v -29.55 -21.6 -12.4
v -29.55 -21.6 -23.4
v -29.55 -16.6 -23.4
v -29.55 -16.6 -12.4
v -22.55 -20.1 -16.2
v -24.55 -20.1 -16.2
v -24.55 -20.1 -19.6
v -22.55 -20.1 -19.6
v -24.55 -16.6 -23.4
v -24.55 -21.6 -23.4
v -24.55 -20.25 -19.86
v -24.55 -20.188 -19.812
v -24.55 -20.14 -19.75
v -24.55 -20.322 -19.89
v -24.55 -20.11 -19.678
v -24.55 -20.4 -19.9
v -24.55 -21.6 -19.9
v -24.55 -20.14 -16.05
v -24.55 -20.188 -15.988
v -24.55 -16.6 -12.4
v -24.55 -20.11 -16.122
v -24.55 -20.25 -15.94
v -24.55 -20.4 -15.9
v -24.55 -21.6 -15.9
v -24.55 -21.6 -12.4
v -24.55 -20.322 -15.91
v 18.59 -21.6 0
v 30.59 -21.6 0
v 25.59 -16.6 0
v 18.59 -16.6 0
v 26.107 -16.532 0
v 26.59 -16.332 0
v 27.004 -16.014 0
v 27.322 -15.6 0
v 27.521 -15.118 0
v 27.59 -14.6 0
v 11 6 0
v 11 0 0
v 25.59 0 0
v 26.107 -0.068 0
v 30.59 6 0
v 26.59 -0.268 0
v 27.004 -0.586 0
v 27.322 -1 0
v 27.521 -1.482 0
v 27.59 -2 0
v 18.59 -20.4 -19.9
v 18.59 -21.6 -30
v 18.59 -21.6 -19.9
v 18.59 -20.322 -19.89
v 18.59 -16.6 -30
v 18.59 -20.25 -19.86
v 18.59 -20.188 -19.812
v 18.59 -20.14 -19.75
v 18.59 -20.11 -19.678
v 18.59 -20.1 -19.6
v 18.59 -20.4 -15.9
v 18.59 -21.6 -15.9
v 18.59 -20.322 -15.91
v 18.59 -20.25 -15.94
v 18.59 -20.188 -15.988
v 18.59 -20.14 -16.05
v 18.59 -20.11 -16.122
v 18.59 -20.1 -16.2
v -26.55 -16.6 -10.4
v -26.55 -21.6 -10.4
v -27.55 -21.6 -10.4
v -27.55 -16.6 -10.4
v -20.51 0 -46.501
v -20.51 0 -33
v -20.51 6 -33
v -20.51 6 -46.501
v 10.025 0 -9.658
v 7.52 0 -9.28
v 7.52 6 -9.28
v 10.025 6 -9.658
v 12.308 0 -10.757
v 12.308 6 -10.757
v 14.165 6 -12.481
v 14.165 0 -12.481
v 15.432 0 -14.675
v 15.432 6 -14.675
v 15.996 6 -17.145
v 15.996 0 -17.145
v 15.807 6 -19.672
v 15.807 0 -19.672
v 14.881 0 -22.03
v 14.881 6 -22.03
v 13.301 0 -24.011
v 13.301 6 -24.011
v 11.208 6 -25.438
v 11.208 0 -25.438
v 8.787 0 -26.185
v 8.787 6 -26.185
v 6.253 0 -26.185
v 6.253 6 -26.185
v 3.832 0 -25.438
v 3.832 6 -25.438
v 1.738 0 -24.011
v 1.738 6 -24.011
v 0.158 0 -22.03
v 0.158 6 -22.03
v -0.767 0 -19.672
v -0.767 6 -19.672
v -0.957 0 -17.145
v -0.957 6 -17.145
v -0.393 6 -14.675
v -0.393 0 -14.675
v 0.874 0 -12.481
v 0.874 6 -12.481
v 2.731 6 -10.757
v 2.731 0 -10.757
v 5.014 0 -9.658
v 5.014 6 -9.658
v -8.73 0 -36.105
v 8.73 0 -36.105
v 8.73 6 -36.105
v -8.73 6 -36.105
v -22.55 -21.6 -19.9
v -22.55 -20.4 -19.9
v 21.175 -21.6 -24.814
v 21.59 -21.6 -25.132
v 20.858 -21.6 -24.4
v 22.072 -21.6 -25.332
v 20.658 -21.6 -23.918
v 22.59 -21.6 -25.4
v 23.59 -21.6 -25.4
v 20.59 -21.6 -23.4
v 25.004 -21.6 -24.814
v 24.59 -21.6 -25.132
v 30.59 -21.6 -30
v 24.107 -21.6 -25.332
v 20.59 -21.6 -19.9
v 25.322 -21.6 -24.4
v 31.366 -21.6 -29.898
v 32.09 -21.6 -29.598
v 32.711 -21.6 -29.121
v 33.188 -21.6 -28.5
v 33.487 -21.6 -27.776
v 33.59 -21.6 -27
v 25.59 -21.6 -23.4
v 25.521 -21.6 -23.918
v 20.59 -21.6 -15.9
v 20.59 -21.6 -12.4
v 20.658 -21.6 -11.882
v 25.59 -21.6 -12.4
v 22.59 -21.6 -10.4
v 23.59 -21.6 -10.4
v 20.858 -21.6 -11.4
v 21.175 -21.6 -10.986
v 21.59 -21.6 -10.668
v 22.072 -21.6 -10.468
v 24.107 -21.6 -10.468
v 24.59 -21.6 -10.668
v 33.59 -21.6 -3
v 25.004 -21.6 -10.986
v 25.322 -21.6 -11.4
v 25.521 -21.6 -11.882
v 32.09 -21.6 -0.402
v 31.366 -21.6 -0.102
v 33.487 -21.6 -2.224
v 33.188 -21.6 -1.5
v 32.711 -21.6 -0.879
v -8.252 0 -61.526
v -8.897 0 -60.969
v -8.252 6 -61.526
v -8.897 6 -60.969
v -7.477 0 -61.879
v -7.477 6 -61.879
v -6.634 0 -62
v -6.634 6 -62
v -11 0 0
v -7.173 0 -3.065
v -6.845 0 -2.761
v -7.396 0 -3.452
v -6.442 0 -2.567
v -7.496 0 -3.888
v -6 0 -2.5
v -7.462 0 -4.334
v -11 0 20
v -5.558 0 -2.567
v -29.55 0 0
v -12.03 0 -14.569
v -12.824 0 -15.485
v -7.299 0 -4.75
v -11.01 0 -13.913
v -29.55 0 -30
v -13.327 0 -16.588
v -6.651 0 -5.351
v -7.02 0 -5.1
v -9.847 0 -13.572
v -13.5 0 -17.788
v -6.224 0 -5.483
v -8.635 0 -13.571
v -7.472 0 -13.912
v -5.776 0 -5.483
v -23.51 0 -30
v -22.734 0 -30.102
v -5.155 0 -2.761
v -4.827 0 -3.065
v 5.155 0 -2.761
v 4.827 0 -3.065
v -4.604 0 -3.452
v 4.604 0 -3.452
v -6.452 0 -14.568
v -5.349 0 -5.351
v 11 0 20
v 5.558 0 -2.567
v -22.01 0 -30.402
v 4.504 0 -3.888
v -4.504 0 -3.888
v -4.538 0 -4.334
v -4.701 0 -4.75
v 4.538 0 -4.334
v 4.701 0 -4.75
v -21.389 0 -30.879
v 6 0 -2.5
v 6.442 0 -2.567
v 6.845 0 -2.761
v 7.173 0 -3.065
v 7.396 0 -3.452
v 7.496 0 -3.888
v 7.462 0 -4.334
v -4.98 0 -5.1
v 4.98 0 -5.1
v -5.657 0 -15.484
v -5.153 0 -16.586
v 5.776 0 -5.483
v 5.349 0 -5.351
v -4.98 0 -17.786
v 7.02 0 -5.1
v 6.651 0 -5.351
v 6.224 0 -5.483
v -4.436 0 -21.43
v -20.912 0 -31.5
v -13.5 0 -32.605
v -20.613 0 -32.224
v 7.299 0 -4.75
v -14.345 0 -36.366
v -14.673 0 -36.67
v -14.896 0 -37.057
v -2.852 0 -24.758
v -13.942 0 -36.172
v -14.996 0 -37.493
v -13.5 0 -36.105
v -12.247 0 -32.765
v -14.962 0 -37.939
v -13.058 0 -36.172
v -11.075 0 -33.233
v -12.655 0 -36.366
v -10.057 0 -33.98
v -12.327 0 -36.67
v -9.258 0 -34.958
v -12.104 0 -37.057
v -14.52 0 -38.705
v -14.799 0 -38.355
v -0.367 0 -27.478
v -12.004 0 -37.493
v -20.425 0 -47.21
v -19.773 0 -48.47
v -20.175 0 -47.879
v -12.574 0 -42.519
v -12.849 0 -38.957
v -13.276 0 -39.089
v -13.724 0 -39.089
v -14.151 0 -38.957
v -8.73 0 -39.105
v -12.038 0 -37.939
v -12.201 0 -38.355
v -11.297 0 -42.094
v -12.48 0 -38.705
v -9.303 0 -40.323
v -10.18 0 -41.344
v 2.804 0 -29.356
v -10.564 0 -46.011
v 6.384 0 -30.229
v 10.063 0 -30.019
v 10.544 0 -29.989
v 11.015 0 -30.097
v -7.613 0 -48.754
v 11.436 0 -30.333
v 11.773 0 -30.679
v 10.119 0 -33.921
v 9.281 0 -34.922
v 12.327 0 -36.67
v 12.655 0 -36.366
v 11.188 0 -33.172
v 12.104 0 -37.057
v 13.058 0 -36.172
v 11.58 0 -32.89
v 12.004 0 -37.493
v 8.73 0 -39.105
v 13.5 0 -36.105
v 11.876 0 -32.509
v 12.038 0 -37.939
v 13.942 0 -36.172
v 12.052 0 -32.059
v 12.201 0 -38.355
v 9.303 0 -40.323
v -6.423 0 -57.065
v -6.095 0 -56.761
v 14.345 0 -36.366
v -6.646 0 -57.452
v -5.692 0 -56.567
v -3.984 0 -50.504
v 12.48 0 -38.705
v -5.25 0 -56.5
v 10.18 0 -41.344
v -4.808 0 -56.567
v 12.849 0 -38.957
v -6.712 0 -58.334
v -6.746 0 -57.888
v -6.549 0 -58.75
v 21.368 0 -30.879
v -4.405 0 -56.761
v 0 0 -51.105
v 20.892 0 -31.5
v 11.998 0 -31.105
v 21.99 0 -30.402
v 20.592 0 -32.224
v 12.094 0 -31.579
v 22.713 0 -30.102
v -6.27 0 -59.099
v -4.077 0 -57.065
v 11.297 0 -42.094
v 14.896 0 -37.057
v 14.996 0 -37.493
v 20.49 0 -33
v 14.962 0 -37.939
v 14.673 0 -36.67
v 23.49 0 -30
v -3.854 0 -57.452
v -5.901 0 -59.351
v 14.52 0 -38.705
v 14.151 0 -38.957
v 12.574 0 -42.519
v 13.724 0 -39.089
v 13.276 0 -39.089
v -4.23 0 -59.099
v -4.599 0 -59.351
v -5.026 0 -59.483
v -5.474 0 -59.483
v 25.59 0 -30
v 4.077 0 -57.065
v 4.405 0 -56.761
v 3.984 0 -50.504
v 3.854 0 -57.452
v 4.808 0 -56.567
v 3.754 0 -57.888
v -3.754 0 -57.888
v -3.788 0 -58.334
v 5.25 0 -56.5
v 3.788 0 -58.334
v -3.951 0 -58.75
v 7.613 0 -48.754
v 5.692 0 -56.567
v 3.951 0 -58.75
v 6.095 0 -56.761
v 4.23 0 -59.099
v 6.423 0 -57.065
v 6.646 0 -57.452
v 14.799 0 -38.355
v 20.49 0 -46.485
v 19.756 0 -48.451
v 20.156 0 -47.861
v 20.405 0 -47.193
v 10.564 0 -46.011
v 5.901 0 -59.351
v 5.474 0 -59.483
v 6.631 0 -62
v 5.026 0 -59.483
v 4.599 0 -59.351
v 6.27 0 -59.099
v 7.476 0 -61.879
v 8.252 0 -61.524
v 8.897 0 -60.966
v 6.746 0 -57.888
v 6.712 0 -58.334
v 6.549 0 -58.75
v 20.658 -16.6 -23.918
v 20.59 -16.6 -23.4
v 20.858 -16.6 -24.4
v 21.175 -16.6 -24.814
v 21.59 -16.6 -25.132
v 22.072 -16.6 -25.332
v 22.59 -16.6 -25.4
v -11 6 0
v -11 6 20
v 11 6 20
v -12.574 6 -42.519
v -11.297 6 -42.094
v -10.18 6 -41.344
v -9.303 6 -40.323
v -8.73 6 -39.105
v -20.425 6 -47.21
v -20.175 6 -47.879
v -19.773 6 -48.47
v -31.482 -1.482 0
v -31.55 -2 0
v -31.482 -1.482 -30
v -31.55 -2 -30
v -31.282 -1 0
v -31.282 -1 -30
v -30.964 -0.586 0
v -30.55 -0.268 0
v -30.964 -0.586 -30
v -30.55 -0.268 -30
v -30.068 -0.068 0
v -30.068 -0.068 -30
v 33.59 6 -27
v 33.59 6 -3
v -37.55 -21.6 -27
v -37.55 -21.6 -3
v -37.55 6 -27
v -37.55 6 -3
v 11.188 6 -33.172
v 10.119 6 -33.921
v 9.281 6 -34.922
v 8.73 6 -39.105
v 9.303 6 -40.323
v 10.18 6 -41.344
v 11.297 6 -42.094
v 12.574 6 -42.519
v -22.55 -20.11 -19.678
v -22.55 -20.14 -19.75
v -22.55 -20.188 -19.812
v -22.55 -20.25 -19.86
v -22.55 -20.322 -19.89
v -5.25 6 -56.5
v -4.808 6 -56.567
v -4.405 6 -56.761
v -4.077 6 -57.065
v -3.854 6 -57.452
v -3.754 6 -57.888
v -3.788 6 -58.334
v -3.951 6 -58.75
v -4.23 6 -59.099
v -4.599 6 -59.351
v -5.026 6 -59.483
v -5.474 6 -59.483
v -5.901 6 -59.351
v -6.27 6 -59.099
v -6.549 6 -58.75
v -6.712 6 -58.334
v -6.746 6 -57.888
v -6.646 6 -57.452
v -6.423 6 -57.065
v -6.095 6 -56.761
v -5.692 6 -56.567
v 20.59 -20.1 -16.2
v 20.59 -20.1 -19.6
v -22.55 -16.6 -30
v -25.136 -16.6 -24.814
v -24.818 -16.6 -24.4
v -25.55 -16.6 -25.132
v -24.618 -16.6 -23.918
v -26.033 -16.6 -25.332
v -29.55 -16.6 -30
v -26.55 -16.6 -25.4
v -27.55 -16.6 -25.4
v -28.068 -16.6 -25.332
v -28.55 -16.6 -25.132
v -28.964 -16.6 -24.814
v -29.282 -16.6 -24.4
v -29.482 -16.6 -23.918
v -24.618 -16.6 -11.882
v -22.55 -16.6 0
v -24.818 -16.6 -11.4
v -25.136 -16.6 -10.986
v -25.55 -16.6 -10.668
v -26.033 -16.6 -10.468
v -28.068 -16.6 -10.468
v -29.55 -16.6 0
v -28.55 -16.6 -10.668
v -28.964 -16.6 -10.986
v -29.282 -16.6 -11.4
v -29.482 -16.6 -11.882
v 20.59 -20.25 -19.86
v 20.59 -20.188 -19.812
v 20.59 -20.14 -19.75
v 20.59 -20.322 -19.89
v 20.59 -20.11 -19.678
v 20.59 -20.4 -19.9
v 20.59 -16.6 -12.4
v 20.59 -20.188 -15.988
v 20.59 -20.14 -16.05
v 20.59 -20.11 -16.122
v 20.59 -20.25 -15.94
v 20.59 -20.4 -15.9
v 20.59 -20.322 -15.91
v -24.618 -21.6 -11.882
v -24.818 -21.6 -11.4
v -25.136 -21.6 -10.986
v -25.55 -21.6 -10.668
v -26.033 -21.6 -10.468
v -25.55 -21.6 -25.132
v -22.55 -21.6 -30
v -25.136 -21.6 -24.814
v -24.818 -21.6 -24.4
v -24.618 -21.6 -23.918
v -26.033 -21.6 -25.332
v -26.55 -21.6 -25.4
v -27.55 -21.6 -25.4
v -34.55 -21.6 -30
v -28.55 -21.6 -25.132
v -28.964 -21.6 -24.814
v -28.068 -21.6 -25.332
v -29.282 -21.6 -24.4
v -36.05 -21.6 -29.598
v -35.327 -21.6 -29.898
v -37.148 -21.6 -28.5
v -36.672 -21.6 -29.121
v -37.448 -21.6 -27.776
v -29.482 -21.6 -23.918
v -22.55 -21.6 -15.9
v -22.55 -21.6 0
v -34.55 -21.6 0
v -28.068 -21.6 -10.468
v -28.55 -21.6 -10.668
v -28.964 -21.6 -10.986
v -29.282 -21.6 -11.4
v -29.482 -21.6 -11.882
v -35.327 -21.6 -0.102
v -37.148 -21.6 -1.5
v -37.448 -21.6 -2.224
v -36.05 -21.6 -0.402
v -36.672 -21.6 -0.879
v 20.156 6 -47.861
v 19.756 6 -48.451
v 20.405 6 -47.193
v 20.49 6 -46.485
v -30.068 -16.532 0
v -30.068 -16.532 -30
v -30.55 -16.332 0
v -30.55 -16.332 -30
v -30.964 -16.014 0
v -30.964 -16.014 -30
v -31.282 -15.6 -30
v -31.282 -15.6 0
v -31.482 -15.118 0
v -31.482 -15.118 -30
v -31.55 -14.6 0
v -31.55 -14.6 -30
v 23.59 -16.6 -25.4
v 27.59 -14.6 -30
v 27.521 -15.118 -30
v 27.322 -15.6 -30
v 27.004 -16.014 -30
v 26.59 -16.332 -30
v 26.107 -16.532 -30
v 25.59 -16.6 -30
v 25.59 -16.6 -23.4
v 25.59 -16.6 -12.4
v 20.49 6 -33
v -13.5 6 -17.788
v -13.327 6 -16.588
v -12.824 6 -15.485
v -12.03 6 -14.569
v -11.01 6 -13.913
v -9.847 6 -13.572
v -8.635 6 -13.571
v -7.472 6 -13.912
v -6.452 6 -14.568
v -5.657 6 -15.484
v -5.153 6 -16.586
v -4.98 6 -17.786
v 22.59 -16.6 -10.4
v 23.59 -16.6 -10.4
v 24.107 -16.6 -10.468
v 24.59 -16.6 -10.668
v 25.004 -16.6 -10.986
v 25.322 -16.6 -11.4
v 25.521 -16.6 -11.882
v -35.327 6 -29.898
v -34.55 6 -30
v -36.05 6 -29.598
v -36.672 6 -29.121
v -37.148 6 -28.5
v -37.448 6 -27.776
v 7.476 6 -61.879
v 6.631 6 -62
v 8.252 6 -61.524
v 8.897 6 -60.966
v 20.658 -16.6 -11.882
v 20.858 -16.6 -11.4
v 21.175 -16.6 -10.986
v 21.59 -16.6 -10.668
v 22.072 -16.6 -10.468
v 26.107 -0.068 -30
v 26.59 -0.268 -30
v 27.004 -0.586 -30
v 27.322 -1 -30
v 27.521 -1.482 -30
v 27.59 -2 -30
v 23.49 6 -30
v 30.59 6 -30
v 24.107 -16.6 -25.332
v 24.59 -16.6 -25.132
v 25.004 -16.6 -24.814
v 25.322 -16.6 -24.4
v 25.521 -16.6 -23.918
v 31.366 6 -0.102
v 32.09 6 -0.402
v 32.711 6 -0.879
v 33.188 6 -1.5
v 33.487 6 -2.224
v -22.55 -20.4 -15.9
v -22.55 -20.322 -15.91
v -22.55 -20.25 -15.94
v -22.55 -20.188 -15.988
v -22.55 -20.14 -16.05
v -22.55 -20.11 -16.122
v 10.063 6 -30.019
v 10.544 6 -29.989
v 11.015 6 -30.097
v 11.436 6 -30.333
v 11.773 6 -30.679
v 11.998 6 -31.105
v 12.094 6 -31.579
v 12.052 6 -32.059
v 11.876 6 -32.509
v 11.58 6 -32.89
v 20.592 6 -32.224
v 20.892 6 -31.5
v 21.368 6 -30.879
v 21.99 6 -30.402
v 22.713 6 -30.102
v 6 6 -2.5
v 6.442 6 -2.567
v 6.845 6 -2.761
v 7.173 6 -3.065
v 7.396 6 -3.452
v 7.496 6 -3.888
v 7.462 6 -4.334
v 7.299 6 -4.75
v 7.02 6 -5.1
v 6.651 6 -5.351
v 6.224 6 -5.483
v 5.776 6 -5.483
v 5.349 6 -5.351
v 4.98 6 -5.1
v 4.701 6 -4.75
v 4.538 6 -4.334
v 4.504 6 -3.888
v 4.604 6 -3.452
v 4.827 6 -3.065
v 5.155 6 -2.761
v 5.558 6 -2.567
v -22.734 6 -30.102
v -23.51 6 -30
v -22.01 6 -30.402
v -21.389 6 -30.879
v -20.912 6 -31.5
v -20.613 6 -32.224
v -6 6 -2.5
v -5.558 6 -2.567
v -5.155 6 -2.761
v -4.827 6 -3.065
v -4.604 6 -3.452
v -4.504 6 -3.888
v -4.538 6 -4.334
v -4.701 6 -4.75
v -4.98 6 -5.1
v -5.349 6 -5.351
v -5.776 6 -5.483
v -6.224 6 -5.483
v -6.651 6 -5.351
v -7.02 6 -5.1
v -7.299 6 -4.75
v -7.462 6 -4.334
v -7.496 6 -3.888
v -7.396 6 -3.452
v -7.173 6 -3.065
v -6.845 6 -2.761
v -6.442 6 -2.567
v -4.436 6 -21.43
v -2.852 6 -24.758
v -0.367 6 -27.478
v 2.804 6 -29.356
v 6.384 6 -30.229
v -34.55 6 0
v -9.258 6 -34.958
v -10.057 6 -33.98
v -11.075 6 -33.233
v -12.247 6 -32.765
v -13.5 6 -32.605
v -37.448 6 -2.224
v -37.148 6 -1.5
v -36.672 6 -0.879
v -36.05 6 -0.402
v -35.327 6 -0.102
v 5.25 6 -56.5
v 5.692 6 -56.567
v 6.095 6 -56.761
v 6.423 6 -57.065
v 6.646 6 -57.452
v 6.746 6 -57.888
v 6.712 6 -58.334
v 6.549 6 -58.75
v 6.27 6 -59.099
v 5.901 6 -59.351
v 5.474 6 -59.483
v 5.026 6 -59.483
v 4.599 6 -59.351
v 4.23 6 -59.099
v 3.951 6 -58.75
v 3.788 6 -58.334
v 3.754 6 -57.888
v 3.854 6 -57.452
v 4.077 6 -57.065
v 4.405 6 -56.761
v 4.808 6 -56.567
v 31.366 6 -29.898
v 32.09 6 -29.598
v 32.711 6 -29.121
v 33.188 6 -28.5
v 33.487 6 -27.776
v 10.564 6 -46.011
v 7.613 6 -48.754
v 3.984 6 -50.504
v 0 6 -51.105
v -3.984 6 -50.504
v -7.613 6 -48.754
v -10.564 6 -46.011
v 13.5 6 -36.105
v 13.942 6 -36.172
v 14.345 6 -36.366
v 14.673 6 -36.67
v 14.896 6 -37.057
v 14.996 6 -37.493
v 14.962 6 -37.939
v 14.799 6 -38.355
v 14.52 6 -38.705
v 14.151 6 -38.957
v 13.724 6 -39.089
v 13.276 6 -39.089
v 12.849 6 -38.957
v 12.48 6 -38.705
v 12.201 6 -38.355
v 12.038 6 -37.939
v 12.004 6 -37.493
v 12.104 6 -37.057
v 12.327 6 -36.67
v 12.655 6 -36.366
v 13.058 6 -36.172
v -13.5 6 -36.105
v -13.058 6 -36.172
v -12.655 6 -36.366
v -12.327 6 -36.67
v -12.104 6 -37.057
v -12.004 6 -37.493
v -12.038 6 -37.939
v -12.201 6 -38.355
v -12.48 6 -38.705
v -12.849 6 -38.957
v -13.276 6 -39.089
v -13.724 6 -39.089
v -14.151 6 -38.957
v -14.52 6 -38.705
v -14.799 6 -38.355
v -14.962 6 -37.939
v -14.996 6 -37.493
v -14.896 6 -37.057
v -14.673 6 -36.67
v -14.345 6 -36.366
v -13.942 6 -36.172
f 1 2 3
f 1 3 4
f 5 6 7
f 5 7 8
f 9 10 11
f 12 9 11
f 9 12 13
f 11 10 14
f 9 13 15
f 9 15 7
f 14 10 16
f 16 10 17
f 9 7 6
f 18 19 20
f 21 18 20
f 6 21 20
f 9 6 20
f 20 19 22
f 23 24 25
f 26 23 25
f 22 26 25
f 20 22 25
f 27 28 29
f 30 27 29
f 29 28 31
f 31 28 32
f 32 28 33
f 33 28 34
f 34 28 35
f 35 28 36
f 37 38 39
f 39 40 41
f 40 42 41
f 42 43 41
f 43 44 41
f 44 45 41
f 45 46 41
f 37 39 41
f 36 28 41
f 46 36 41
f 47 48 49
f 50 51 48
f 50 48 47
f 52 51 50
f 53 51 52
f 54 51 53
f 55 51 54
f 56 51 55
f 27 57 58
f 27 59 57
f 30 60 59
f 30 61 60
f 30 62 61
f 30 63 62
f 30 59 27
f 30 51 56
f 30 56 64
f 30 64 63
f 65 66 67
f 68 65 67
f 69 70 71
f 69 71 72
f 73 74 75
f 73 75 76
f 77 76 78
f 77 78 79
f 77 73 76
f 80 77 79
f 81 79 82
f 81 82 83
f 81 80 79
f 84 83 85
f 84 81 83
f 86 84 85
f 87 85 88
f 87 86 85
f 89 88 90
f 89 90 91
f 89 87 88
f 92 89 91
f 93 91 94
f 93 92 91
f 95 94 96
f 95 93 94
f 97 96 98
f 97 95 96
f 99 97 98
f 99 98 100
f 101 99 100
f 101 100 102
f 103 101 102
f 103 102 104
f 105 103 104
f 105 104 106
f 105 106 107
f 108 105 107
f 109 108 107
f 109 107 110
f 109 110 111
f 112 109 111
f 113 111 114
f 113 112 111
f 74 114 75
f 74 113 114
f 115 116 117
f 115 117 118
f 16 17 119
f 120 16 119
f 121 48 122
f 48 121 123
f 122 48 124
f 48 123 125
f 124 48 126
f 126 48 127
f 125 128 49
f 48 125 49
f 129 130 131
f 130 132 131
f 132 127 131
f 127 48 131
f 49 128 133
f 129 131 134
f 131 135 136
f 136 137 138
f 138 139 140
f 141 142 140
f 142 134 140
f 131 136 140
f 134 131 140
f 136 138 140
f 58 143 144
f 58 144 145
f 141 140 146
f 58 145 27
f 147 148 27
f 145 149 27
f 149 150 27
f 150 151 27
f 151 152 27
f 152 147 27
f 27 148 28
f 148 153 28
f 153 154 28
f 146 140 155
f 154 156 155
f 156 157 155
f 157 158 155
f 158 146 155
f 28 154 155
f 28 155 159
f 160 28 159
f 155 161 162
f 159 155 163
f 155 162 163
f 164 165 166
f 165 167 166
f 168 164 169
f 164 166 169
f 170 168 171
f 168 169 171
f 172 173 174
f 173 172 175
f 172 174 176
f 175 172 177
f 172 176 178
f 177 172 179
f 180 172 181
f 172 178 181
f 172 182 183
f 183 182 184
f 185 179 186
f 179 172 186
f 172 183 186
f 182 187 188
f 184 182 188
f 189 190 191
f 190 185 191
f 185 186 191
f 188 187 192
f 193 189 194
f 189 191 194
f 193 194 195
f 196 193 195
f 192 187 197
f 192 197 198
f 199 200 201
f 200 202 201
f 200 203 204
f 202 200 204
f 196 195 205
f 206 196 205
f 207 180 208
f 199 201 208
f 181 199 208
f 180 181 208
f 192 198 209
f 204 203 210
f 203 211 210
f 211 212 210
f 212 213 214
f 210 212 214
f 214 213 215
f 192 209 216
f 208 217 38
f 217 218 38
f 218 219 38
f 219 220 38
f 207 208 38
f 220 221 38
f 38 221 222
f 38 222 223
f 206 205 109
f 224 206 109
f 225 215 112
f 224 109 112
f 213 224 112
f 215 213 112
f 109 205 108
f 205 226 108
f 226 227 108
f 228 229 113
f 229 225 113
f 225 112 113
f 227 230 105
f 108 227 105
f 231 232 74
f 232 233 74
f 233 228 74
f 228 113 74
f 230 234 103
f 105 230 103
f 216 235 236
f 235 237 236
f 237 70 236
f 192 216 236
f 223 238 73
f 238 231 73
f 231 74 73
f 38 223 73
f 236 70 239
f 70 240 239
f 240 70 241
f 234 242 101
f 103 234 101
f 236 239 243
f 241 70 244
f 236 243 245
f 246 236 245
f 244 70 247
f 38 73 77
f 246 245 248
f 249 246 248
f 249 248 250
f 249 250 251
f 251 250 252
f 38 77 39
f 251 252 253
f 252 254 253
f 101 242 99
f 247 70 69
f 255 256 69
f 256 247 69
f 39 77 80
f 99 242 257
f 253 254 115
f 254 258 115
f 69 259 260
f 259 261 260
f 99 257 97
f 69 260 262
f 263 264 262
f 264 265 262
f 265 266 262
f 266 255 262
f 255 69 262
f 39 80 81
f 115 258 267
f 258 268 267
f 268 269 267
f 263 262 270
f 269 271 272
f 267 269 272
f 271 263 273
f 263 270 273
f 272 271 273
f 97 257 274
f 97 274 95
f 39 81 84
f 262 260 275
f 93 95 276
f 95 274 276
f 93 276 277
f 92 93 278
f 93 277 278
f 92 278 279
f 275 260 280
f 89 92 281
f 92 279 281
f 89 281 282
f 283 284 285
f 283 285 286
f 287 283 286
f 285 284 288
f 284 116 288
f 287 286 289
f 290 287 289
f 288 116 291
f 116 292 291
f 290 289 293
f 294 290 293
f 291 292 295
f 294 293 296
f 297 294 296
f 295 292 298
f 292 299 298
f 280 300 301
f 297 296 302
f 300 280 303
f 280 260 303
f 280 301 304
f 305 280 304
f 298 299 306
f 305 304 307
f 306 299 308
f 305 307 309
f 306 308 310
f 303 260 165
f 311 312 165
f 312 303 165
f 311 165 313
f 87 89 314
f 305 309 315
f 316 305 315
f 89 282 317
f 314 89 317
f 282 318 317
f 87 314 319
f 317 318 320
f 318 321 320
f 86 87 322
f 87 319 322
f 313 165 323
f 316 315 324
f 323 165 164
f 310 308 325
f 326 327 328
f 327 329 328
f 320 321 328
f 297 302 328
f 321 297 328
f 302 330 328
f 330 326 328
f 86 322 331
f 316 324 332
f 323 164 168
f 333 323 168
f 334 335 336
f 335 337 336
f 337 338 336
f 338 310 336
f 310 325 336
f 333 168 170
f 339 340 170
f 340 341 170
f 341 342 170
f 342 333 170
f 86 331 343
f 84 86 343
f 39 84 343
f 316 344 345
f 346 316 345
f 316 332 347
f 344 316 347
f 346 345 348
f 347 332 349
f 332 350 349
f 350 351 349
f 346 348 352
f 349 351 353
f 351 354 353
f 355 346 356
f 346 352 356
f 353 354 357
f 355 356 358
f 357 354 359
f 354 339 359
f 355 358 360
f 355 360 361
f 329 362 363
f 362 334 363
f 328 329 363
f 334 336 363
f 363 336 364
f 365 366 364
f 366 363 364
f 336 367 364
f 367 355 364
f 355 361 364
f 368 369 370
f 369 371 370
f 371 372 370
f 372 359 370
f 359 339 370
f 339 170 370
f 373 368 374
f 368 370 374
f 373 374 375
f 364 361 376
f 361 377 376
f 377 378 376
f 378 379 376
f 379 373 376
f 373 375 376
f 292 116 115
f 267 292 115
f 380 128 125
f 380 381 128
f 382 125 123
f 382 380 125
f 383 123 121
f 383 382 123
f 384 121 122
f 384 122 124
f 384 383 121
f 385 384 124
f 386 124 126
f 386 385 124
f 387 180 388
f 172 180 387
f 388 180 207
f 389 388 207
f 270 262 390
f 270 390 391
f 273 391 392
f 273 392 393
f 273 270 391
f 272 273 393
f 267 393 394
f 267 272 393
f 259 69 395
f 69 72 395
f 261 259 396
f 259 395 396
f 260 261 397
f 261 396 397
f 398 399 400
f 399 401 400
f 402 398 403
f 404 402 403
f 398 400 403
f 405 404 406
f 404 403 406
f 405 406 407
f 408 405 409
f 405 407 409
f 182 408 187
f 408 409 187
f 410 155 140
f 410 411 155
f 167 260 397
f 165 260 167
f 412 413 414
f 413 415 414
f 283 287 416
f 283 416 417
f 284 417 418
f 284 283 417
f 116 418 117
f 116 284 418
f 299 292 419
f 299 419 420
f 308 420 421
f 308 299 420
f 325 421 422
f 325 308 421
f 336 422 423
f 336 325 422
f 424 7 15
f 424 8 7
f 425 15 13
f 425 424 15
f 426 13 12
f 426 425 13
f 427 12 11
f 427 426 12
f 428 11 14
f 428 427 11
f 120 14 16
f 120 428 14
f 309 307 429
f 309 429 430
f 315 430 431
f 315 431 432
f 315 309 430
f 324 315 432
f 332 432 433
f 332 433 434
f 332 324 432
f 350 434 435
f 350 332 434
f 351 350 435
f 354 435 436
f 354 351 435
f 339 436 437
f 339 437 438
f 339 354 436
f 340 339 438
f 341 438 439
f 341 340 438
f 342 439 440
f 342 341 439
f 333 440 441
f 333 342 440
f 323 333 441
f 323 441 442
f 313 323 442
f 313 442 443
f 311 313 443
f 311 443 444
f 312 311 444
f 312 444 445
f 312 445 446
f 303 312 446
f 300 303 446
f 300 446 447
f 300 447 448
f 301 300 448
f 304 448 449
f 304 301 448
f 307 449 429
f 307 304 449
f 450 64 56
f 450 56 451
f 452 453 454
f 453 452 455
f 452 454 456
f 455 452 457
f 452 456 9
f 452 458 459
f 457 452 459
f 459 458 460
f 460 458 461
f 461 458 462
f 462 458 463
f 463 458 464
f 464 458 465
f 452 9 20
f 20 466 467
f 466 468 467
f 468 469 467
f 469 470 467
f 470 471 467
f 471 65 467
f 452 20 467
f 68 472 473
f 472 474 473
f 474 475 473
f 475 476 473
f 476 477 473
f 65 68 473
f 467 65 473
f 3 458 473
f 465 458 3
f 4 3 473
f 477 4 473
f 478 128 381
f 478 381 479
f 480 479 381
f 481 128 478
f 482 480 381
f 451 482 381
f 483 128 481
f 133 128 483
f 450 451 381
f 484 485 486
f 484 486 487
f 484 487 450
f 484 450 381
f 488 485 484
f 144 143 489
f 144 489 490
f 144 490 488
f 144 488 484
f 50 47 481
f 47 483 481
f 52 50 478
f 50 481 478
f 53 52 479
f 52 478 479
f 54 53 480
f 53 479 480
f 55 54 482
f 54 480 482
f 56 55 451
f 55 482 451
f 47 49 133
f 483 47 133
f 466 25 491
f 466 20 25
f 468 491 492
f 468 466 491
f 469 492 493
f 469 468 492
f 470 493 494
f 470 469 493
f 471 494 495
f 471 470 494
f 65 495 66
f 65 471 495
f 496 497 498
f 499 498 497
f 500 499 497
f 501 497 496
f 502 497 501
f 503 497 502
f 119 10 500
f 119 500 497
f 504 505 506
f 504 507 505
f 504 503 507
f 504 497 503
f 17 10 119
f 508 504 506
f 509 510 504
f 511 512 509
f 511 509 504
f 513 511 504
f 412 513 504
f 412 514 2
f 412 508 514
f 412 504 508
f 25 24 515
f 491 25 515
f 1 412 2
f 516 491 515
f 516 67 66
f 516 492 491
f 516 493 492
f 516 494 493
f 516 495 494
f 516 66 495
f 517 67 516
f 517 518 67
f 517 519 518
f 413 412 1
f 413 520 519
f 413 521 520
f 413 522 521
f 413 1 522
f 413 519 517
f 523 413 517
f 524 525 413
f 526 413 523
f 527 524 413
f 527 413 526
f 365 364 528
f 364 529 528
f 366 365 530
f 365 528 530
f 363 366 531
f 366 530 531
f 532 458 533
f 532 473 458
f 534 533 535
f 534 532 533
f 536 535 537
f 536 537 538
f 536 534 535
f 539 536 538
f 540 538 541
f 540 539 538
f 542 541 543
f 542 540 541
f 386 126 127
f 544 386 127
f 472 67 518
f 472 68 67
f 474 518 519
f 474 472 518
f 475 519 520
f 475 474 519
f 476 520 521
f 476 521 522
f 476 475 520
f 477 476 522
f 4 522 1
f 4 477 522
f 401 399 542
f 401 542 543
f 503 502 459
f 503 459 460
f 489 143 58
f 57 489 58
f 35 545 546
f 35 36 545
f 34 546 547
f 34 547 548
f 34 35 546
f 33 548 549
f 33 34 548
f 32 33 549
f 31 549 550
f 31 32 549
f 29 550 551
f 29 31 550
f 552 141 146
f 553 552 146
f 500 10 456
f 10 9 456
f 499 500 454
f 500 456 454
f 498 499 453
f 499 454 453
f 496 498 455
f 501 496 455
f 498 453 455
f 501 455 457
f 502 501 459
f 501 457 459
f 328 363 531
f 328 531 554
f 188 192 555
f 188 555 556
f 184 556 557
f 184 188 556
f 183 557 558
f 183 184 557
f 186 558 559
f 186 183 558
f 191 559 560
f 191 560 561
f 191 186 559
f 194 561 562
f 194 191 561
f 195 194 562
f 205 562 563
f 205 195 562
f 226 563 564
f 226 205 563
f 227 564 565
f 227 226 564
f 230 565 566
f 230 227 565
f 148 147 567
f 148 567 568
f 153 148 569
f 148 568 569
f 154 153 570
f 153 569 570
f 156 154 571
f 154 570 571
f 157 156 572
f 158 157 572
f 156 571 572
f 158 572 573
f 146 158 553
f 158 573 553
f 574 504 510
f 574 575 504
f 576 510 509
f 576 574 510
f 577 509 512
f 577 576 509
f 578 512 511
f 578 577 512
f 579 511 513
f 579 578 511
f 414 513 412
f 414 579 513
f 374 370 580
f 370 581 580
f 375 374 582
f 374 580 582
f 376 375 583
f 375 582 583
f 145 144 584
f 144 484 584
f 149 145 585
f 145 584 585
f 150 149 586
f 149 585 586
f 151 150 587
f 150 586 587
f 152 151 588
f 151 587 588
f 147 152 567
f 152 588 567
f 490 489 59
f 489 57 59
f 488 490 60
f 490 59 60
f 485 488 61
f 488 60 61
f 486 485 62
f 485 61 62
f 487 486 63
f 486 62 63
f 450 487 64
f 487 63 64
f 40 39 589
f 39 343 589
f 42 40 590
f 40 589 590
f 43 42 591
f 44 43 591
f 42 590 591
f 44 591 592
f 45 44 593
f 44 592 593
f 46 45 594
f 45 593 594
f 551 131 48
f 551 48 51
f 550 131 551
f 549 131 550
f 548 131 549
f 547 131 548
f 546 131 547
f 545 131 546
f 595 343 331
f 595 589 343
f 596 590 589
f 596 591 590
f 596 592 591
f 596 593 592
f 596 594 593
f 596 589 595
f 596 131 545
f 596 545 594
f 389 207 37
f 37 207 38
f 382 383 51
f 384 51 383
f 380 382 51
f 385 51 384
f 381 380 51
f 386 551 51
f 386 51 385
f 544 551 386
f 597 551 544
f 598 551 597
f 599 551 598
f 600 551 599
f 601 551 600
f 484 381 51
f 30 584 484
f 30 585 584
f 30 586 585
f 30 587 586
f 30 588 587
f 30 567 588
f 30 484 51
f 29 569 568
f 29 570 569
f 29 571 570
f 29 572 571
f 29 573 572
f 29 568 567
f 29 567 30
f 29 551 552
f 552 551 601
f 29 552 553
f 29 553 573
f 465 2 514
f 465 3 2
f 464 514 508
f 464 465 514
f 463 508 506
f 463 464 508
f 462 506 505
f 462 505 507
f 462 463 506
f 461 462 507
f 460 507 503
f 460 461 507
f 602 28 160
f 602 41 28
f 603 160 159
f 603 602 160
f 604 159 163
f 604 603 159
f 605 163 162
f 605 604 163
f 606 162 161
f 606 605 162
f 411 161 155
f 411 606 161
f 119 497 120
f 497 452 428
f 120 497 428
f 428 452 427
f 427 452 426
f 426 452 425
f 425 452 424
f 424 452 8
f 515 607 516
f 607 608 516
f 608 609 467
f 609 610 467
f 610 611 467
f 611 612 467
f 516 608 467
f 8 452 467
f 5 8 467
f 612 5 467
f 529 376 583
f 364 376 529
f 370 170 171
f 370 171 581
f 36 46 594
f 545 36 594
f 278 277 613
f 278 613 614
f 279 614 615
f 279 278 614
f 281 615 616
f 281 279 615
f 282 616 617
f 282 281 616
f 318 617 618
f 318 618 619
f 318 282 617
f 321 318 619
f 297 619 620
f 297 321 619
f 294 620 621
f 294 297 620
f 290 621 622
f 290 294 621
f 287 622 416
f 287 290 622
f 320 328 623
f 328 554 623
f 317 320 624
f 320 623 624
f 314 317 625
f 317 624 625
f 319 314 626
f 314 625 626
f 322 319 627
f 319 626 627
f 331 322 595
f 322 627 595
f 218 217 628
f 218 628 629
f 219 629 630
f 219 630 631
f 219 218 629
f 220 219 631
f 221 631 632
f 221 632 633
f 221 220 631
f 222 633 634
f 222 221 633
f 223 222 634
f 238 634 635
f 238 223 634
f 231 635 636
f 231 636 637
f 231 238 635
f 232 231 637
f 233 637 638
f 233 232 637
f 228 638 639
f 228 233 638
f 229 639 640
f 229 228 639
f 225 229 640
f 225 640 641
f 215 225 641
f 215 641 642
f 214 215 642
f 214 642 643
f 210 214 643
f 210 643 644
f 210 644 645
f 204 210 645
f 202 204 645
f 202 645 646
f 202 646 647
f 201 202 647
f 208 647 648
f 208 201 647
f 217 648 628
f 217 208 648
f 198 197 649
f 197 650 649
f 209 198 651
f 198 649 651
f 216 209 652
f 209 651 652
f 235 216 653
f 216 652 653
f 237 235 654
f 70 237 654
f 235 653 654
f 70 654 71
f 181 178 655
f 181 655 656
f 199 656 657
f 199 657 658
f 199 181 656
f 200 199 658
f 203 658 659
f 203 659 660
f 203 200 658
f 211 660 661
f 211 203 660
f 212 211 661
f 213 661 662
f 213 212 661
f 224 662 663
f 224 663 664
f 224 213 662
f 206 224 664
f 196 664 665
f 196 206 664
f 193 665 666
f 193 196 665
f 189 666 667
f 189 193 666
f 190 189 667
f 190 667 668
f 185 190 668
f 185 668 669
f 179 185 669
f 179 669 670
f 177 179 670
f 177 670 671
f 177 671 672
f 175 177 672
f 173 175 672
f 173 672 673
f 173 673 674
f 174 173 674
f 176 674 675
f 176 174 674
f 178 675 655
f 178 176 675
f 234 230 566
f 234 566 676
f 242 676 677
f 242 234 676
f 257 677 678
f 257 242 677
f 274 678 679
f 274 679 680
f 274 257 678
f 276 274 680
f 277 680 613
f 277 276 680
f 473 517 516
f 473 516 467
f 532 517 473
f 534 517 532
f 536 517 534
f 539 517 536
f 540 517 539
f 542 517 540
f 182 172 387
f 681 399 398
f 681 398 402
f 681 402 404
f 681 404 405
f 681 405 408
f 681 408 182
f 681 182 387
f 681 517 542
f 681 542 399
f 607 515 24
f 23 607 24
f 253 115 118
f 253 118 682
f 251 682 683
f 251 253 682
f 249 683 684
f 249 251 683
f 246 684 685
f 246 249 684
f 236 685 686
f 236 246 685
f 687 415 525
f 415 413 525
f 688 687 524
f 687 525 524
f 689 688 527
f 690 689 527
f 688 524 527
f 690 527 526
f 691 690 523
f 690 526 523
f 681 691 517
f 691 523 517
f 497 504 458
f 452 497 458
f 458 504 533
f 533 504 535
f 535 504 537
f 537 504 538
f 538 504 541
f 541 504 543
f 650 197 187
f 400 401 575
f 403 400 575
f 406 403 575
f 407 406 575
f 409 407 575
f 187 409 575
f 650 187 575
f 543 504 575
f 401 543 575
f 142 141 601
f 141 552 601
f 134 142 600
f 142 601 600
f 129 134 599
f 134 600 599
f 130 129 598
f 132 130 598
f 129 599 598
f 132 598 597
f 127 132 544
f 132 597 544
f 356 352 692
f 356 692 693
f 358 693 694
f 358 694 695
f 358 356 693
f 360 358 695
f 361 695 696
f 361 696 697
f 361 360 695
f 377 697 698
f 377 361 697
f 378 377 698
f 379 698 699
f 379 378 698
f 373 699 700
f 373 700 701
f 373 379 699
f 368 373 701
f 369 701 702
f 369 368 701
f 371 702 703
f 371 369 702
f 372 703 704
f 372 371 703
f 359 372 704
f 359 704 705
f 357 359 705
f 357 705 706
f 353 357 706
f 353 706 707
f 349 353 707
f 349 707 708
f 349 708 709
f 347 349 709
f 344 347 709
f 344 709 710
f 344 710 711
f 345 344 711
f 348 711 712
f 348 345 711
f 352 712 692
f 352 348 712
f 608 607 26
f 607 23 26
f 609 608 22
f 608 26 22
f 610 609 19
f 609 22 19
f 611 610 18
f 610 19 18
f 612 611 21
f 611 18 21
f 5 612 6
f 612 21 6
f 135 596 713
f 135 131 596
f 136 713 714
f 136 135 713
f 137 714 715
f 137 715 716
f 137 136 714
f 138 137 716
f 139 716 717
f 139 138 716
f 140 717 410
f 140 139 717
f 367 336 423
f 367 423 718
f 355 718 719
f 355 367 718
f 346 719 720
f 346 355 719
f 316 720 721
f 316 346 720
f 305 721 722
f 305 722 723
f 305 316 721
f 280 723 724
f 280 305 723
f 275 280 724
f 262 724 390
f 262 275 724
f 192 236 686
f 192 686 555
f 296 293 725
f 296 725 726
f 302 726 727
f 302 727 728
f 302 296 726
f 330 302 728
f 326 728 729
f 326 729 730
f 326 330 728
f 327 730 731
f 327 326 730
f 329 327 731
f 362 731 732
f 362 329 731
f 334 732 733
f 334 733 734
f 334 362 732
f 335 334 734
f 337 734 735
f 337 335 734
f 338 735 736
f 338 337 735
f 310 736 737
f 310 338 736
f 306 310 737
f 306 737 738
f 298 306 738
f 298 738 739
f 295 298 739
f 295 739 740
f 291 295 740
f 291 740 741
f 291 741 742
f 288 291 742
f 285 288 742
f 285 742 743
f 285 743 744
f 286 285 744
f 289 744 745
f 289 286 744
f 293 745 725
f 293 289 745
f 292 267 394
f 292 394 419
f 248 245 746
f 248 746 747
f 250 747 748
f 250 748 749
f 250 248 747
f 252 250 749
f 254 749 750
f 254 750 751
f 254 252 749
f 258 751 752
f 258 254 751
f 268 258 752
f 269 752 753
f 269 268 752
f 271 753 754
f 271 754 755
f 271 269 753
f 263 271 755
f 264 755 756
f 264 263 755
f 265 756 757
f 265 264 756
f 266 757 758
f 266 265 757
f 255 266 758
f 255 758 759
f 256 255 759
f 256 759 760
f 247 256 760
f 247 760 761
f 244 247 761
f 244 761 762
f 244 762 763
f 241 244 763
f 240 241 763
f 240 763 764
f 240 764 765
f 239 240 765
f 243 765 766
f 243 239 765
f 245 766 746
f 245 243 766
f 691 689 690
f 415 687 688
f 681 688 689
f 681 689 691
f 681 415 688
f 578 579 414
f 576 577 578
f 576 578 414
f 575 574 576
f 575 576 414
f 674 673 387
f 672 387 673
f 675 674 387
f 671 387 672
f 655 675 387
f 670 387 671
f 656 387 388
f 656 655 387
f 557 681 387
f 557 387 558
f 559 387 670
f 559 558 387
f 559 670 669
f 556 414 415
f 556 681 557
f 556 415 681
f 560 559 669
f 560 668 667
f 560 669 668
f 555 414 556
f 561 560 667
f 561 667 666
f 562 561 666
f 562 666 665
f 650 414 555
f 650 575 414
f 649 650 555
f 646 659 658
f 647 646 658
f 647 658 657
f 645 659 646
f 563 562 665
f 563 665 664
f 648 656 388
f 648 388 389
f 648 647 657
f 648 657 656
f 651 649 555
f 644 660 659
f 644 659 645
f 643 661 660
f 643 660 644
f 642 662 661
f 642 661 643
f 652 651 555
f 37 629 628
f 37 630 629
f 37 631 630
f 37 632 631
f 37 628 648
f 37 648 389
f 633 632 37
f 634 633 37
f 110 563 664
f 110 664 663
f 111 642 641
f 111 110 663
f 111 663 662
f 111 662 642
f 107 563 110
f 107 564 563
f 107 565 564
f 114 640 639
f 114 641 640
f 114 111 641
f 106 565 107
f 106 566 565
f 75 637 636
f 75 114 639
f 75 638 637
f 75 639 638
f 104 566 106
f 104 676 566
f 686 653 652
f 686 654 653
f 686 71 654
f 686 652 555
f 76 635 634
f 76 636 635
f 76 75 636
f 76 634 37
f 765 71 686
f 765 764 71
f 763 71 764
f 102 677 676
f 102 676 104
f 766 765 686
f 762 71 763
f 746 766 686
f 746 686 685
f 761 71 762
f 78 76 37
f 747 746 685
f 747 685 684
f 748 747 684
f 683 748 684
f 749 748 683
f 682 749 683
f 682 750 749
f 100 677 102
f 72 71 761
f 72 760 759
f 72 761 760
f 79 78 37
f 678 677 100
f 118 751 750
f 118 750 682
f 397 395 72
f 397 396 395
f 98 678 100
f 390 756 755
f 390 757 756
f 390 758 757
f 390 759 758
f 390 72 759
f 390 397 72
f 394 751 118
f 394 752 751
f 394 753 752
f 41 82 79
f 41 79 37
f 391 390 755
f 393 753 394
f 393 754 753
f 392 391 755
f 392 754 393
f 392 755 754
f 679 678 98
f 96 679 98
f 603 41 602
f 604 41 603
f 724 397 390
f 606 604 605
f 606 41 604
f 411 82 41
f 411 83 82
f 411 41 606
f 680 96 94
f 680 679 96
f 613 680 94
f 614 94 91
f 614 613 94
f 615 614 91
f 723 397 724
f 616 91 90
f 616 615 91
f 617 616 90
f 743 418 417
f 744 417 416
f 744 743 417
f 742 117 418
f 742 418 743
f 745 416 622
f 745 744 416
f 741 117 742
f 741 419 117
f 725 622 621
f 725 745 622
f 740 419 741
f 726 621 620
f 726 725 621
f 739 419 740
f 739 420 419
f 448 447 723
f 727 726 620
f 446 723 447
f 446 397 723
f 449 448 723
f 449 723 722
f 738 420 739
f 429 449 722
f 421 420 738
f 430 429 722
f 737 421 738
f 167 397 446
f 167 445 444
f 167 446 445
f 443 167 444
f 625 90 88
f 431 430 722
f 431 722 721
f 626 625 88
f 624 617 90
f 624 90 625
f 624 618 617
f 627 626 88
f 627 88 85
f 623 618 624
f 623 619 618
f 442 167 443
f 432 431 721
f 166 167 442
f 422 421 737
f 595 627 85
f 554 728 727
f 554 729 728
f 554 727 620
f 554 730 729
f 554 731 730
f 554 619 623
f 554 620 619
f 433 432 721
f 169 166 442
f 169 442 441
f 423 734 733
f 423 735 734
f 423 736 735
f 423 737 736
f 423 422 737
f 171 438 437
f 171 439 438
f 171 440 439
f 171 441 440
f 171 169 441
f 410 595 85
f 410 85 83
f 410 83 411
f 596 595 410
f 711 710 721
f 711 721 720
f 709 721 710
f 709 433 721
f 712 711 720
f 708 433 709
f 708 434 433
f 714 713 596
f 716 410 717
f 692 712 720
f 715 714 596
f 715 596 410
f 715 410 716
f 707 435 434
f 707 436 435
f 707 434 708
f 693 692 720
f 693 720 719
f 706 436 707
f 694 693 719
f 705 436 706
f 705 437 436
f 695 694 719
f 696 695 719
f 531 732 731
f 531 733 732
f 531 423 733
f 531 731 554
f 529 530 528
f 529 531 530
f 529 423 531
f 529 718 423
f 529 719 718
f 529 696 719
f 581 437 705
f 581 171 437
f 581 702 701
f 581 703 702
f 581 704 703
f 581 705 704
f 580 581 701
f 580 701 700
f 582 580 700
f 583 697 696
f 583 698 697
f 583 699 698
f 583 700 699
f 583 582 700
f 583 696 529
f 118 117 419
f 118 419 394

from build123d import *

# Parameters (mm, degrees)
SKETCH1_R                = 1.5
SKETCH1_R_2              = 8.5
SKETCH1_W                = 6
SKETCH1_H                = 30
SKETCH1_W_2              = 22
SKETCH1_H_2              = 20
BOSS_EXTRUDE1_DEPTH      = 6
SKETCH1_5_W              = 6
SKETCH1_5_H              = 30
RESSALTO_EXTRUS_O1_DEPTH = 21.6
ESBO_O1_W                = 30
ESBO_O1_H                = 5
RESSALTO_EXTRUS_O2_DEPTH = 9
CORTE_EXTRUS_O1_REACH    = 79.561
ESBO_O2_W                = 5
ESBO_O2_H                = 15
FILETE2_R                = 2
FILETE2_OF_ESPELHAR1_R   = 2
FILLET1_R                = 3
FILETE1_R                = 2
ESBO_O4_W                = 2
ESBO_O4_H                = 4
ESBO_O4_W_2              = 45.13986754
CORTE_EXTRUS_O3_DEPTH    = 1.5
FILETE3_R                = 0.3


with BuildPart() as part:
    # Sketch1 → Boss-Extrude1 (new body)
    # profile 1 of 6: a face of its own
    with BuildSketch(Plane(origin=(0, 0, 0), x_dir=(1, 0, 0), z_dir=(0, 1, 0))):
        Polygon((-20.510374251, 47.623346162), (-8, 62), (8, 62), (20.489621783, 47.605313925), (20.489621783, 17.605313925), (11, 0), (-11, 0), (-20.510374251, 17.623346162), align=None)
        with Locations(Location((13.5, 37.605313925, 0), (0, 0, 270))):
            Circle(SKETCH1_R, mode=Mode.SUBTRACT)
        with Locations(Location((-13.5, 37.605313925, 0), (0, 0, 270))):
            Circle(SKETCH1_R, mode=Mode.SUBTRACT)
        with Locations(Location((5.25, 57.999859765, 0), (0, 0, 270))):
            Circle(SKETCH1_R, mode=Mode.SUBTRACT)
        with Locations(Location((-5.25, 57.999859765, 0), (0, 0, 270))):
            Circle(SKETCH1_R, mode=Mode.SUBTRACT)
        with Locations(Location((7.519679741, 17.780252273, 0), (0, 0, 270))):
            Circle(SKETCH1_R_2, mode=Mode.SUBTRACT)
        with Locations(Location((6, 4, 0), (0, 0, 270))):
            Circle(SKETCH1_R, mode=Mode.SUBTRACT)
        with Locations(Location((-6, 4, 0), (0, 0, 270))):
            Circle(SKETCH1_R, mode=Mode.SUBTRACT)
        with BuildLine():
            ThreePointArc((10.062695821, 30.018841621), (11.998189223, 31.105465162), (11.187975781, 33.171969363))
            ThreePointArc((11.187975781, 33.171969363), (9.667400631, 34.394210987), (8.730303993, 36.105313925))
            Line((8.730303993, 36.105313925), (-8.730303993, 36.105313925))
            ThreePointArc((-8.730303993, 36.105313925), (-10.541960108, 33.574185051), (-13.5, 32.605313925))
            Line((-13.5, 32.605313925), (-13.5, 17.787899155))
            ThreePointArc((-13.5, 17.787899155), (-9.241131059, 13.528058523), (-4.980318958, 17.785955551))
            ThreePointArc((-4.980318958, 17.785955551), (-0.366780245, 27.478383479), (10.062695821, 30.018841621))
        make_face(mode=Mode.SUBTRACT)
        with BuildLine():
            ThreePointArc((12.574074074, 42.518832133), (0, 51.105313925), (-12.574074074, 42.518832133))
            ThreePointArc((-12.574074074, 42.518832133), (-10.179901517, 41.34388933), (-8.730303993, 39.105313925))
            Line((-8.730303993, 39.105313925), (8.730303993, 39.105313925))
            ThreePointArc((8.730303993, 39.105313925), (10.179901517, 41.34388933), (12.574074074, 42.518832133))
        make_face(mode=Mode.SUBTRACT)
    # profile 2 of 6: a face of its own
    with BuildSketch(Plane(origin=(0, 0, 0), x_dir=(1, 0, 0), z_dir=(0, 1, 0))):
        Polygon((20.489621783, 17.605313925), (11, 0), (27.589621783, 0), (27.589621783, 30), (20.489621783, 30), align=None)
    # profile 3 of 6: a face of its own
    with BuildSketch(Plane(origin=(0, 0, 0), x_dir=(1, 0, 0), z_dir=(0, 1, 0))):
        with Locations((30.589621783, 15)):
            Rectangle(SKETCH1_W, SKETCH1_H)
    # profile 4 of 6: a face of its own
    with BuildSketch(Plane(origin=(0, 0, 0), x_dir=(1, 0, 0), z_dir=(0, 1, 0))):
        with Locations((0, -10)):
            Rectangle(SKETCH1_W_2, SKETCH1_H_2)
    # profile 5 of 6: a face of its own
    with BuildSketch(Plane(origin=(0, 0, 0), x_dir=(1, 0, 0), z_dir=(0, 1, 0))):
        Polygon((-31.550245757, 0), (-11, 0), (-20.510374251, 17.623346162), (-20.510374251, 30), (-31.550245757, 30), align=None)
    # profile 6 of 6: a face of its own
    with BuildSketch(Plane(origin=(0, 0, 0), x_dir=(1, 0, 0), z_dir=(0, 1, 0))):
        with Locations((-34.550245757, 15)):
            Rectangle(SKETCH1_W, SKETCH1_H)
    extrude(amount=BOSS_EXTRUDE1_DEPTH)

    # Sketch1<5> → Ressalto-extrusão1 (add)
    with BuildSketch(Plane(origin=(0, 0, 0), x_dir=(1, 0, 0), z_dir=(0, 1, 0))):
        with Locations((30.589621783, 15)):
            Rectangle(SKETCH1_5_W, SKETCH1_5_H)
    ressalto_extrus_o1 = extrude(amount=-RESSALTO_EXTRUS_O1_DEPTH)

    # Esboço1 → Ressalto-extrusão2 (add)
    with BuildSketch(Plane.ZY.offset(-27.589621783)):
        with Locations((-15, -19.1)):
            Rectangle(ESBO_O1_W, ESBO_O1_H)
    ressalto_extrus_o2 = extrude(amount=RESSALTO_EXTRUS_O2_DEPTH)

    # Esboço2 → Corte-extrusão1 (cut, up to next)
    with BuildSketch(Plane.XZ.offset(21.6), mode=Mode.PRIVATE) as corte_extrus_o1_sk1:
        with Locations((23.089621783, -17.9)):
            Rectangle(ESBO_O2_W, ESBO_O2_H)
    corte_extrus_o1_tool1 = extrude(corte_extrus_o1_sk1.sketch, amount=-CORTE_EXTRUS_O1_REACH, mode=Mode.PRIVATE) & part.part
    corte_extrus_o1 = corte_extrus_o1_tool1.solids().sort_by_distance((23.089622, -21.6, -17.9))[0]
    add(corte_extrus_o1, mode=Mode.SUBTRACT)

    # Filete2
    filete2_edges = [part.edges().sort_by_distance(p)[0] for p in [
        (25.589621783, -19.1, -25.4),
        (25.589621783, -19.1, -10.4),
        (20.589621783, -19.1, -10.4),
        (20.589621783, -19.1, -25.4),
    ]]
    fillet(filete2_edges, radius=FILETE2_R)

    # Espelhar1: Ressalto-extrusão1, Ressalto-extrusão2, Corte-extrusão1 across plane
    add(ressalto_extrus_o1.mirror(Plane.ZY.offset(1.980311987)))
    add(ressalto_extrus_o2.mirror(Plane.ZY.offset(1.980311987)))
    add(corte_extrus_o1.mirror(Plane.ZY.offset(1.980311987)), mode=Mode.SUBTRACT)

    # Filete2 of Espelhar1
    filete2_of_espelhar1_edges = [part.edges().sort_by_distance(p)[0] for p in [
        (-29.550245757, -19.1, -25.4),
        (-29.550245757, -19.1, -10.4),
        (-24.550245757, -19.1, -10.4),
        (-24.550245757, -19.1, -25.4),
    ]]
    fillet(filete2_of_espelhar1_edges, radius=FILETE2_OF_ESPELHAR1_R)

    # Fillet1
    fillet1_edges = [part.edges().sort_by_distance(p)[0] for p in [
        (-20.510374251, 3, -47.623346162),
        (-8, 3, -62),
        (8, 3, -62),
        (20.489621783, 3, -47.605313925),
        (20.489621783, 3, -30),
        (33.589621783, -7.8, -30),
        (33.589621783, -7.8, 0),
        (-37.550245757, -7.8, 0),
        (-37.550245757, -7.8, -30),
        (-20.510374251, 3, -30),
    ]]
    fillet(fillet1_edges, radius=FILLET1_R)

    # Filete1
    filete1_edges = [part.edges().sort_by_distance(p)[0] for p in [
        (27.589621783, 0, -15),
        (27.589621783, -16.6, -15),
        (-31.550245757, 0, -15),
        (-31.550245757, -16.6, -15),
    ]]
    fillet(filete1_edges, radius=FILETE1_R - 0.0001)  # a hair under: the kernel refuses the full size

    # Esboço4 → Corte-extrusão3 (cut)
    with BuildSketch(Plane.XZ.offset(21.6)):
        with Locations((-23.550245757, -17.9)):
            Rectangle(ESBO_O4_W, ESBO_O4_H)
        with Locations((0.019688013, -17.9)):
            Rectangle(ESBO_O4_W_2, ESBO_O4_H)
    extrude(amount=-CORTE_EXTRUS_O3_DEPTH, mode=Mode.SUBTRACT)

    # Filete3
    filete3_edges = [part.edges().sort_by_distance(p)[0] for p in [
        (19.589621783, -20.1, -19.9),
        (-23.550245757, -20.1, -19.9),
        (19.589621783, -20.1, -15.9),
        (-23.550245757, -20.1, -15.9),
    ]]
    fillet(filete3_edges, radius=FILETE3_R)


solid = part.part
